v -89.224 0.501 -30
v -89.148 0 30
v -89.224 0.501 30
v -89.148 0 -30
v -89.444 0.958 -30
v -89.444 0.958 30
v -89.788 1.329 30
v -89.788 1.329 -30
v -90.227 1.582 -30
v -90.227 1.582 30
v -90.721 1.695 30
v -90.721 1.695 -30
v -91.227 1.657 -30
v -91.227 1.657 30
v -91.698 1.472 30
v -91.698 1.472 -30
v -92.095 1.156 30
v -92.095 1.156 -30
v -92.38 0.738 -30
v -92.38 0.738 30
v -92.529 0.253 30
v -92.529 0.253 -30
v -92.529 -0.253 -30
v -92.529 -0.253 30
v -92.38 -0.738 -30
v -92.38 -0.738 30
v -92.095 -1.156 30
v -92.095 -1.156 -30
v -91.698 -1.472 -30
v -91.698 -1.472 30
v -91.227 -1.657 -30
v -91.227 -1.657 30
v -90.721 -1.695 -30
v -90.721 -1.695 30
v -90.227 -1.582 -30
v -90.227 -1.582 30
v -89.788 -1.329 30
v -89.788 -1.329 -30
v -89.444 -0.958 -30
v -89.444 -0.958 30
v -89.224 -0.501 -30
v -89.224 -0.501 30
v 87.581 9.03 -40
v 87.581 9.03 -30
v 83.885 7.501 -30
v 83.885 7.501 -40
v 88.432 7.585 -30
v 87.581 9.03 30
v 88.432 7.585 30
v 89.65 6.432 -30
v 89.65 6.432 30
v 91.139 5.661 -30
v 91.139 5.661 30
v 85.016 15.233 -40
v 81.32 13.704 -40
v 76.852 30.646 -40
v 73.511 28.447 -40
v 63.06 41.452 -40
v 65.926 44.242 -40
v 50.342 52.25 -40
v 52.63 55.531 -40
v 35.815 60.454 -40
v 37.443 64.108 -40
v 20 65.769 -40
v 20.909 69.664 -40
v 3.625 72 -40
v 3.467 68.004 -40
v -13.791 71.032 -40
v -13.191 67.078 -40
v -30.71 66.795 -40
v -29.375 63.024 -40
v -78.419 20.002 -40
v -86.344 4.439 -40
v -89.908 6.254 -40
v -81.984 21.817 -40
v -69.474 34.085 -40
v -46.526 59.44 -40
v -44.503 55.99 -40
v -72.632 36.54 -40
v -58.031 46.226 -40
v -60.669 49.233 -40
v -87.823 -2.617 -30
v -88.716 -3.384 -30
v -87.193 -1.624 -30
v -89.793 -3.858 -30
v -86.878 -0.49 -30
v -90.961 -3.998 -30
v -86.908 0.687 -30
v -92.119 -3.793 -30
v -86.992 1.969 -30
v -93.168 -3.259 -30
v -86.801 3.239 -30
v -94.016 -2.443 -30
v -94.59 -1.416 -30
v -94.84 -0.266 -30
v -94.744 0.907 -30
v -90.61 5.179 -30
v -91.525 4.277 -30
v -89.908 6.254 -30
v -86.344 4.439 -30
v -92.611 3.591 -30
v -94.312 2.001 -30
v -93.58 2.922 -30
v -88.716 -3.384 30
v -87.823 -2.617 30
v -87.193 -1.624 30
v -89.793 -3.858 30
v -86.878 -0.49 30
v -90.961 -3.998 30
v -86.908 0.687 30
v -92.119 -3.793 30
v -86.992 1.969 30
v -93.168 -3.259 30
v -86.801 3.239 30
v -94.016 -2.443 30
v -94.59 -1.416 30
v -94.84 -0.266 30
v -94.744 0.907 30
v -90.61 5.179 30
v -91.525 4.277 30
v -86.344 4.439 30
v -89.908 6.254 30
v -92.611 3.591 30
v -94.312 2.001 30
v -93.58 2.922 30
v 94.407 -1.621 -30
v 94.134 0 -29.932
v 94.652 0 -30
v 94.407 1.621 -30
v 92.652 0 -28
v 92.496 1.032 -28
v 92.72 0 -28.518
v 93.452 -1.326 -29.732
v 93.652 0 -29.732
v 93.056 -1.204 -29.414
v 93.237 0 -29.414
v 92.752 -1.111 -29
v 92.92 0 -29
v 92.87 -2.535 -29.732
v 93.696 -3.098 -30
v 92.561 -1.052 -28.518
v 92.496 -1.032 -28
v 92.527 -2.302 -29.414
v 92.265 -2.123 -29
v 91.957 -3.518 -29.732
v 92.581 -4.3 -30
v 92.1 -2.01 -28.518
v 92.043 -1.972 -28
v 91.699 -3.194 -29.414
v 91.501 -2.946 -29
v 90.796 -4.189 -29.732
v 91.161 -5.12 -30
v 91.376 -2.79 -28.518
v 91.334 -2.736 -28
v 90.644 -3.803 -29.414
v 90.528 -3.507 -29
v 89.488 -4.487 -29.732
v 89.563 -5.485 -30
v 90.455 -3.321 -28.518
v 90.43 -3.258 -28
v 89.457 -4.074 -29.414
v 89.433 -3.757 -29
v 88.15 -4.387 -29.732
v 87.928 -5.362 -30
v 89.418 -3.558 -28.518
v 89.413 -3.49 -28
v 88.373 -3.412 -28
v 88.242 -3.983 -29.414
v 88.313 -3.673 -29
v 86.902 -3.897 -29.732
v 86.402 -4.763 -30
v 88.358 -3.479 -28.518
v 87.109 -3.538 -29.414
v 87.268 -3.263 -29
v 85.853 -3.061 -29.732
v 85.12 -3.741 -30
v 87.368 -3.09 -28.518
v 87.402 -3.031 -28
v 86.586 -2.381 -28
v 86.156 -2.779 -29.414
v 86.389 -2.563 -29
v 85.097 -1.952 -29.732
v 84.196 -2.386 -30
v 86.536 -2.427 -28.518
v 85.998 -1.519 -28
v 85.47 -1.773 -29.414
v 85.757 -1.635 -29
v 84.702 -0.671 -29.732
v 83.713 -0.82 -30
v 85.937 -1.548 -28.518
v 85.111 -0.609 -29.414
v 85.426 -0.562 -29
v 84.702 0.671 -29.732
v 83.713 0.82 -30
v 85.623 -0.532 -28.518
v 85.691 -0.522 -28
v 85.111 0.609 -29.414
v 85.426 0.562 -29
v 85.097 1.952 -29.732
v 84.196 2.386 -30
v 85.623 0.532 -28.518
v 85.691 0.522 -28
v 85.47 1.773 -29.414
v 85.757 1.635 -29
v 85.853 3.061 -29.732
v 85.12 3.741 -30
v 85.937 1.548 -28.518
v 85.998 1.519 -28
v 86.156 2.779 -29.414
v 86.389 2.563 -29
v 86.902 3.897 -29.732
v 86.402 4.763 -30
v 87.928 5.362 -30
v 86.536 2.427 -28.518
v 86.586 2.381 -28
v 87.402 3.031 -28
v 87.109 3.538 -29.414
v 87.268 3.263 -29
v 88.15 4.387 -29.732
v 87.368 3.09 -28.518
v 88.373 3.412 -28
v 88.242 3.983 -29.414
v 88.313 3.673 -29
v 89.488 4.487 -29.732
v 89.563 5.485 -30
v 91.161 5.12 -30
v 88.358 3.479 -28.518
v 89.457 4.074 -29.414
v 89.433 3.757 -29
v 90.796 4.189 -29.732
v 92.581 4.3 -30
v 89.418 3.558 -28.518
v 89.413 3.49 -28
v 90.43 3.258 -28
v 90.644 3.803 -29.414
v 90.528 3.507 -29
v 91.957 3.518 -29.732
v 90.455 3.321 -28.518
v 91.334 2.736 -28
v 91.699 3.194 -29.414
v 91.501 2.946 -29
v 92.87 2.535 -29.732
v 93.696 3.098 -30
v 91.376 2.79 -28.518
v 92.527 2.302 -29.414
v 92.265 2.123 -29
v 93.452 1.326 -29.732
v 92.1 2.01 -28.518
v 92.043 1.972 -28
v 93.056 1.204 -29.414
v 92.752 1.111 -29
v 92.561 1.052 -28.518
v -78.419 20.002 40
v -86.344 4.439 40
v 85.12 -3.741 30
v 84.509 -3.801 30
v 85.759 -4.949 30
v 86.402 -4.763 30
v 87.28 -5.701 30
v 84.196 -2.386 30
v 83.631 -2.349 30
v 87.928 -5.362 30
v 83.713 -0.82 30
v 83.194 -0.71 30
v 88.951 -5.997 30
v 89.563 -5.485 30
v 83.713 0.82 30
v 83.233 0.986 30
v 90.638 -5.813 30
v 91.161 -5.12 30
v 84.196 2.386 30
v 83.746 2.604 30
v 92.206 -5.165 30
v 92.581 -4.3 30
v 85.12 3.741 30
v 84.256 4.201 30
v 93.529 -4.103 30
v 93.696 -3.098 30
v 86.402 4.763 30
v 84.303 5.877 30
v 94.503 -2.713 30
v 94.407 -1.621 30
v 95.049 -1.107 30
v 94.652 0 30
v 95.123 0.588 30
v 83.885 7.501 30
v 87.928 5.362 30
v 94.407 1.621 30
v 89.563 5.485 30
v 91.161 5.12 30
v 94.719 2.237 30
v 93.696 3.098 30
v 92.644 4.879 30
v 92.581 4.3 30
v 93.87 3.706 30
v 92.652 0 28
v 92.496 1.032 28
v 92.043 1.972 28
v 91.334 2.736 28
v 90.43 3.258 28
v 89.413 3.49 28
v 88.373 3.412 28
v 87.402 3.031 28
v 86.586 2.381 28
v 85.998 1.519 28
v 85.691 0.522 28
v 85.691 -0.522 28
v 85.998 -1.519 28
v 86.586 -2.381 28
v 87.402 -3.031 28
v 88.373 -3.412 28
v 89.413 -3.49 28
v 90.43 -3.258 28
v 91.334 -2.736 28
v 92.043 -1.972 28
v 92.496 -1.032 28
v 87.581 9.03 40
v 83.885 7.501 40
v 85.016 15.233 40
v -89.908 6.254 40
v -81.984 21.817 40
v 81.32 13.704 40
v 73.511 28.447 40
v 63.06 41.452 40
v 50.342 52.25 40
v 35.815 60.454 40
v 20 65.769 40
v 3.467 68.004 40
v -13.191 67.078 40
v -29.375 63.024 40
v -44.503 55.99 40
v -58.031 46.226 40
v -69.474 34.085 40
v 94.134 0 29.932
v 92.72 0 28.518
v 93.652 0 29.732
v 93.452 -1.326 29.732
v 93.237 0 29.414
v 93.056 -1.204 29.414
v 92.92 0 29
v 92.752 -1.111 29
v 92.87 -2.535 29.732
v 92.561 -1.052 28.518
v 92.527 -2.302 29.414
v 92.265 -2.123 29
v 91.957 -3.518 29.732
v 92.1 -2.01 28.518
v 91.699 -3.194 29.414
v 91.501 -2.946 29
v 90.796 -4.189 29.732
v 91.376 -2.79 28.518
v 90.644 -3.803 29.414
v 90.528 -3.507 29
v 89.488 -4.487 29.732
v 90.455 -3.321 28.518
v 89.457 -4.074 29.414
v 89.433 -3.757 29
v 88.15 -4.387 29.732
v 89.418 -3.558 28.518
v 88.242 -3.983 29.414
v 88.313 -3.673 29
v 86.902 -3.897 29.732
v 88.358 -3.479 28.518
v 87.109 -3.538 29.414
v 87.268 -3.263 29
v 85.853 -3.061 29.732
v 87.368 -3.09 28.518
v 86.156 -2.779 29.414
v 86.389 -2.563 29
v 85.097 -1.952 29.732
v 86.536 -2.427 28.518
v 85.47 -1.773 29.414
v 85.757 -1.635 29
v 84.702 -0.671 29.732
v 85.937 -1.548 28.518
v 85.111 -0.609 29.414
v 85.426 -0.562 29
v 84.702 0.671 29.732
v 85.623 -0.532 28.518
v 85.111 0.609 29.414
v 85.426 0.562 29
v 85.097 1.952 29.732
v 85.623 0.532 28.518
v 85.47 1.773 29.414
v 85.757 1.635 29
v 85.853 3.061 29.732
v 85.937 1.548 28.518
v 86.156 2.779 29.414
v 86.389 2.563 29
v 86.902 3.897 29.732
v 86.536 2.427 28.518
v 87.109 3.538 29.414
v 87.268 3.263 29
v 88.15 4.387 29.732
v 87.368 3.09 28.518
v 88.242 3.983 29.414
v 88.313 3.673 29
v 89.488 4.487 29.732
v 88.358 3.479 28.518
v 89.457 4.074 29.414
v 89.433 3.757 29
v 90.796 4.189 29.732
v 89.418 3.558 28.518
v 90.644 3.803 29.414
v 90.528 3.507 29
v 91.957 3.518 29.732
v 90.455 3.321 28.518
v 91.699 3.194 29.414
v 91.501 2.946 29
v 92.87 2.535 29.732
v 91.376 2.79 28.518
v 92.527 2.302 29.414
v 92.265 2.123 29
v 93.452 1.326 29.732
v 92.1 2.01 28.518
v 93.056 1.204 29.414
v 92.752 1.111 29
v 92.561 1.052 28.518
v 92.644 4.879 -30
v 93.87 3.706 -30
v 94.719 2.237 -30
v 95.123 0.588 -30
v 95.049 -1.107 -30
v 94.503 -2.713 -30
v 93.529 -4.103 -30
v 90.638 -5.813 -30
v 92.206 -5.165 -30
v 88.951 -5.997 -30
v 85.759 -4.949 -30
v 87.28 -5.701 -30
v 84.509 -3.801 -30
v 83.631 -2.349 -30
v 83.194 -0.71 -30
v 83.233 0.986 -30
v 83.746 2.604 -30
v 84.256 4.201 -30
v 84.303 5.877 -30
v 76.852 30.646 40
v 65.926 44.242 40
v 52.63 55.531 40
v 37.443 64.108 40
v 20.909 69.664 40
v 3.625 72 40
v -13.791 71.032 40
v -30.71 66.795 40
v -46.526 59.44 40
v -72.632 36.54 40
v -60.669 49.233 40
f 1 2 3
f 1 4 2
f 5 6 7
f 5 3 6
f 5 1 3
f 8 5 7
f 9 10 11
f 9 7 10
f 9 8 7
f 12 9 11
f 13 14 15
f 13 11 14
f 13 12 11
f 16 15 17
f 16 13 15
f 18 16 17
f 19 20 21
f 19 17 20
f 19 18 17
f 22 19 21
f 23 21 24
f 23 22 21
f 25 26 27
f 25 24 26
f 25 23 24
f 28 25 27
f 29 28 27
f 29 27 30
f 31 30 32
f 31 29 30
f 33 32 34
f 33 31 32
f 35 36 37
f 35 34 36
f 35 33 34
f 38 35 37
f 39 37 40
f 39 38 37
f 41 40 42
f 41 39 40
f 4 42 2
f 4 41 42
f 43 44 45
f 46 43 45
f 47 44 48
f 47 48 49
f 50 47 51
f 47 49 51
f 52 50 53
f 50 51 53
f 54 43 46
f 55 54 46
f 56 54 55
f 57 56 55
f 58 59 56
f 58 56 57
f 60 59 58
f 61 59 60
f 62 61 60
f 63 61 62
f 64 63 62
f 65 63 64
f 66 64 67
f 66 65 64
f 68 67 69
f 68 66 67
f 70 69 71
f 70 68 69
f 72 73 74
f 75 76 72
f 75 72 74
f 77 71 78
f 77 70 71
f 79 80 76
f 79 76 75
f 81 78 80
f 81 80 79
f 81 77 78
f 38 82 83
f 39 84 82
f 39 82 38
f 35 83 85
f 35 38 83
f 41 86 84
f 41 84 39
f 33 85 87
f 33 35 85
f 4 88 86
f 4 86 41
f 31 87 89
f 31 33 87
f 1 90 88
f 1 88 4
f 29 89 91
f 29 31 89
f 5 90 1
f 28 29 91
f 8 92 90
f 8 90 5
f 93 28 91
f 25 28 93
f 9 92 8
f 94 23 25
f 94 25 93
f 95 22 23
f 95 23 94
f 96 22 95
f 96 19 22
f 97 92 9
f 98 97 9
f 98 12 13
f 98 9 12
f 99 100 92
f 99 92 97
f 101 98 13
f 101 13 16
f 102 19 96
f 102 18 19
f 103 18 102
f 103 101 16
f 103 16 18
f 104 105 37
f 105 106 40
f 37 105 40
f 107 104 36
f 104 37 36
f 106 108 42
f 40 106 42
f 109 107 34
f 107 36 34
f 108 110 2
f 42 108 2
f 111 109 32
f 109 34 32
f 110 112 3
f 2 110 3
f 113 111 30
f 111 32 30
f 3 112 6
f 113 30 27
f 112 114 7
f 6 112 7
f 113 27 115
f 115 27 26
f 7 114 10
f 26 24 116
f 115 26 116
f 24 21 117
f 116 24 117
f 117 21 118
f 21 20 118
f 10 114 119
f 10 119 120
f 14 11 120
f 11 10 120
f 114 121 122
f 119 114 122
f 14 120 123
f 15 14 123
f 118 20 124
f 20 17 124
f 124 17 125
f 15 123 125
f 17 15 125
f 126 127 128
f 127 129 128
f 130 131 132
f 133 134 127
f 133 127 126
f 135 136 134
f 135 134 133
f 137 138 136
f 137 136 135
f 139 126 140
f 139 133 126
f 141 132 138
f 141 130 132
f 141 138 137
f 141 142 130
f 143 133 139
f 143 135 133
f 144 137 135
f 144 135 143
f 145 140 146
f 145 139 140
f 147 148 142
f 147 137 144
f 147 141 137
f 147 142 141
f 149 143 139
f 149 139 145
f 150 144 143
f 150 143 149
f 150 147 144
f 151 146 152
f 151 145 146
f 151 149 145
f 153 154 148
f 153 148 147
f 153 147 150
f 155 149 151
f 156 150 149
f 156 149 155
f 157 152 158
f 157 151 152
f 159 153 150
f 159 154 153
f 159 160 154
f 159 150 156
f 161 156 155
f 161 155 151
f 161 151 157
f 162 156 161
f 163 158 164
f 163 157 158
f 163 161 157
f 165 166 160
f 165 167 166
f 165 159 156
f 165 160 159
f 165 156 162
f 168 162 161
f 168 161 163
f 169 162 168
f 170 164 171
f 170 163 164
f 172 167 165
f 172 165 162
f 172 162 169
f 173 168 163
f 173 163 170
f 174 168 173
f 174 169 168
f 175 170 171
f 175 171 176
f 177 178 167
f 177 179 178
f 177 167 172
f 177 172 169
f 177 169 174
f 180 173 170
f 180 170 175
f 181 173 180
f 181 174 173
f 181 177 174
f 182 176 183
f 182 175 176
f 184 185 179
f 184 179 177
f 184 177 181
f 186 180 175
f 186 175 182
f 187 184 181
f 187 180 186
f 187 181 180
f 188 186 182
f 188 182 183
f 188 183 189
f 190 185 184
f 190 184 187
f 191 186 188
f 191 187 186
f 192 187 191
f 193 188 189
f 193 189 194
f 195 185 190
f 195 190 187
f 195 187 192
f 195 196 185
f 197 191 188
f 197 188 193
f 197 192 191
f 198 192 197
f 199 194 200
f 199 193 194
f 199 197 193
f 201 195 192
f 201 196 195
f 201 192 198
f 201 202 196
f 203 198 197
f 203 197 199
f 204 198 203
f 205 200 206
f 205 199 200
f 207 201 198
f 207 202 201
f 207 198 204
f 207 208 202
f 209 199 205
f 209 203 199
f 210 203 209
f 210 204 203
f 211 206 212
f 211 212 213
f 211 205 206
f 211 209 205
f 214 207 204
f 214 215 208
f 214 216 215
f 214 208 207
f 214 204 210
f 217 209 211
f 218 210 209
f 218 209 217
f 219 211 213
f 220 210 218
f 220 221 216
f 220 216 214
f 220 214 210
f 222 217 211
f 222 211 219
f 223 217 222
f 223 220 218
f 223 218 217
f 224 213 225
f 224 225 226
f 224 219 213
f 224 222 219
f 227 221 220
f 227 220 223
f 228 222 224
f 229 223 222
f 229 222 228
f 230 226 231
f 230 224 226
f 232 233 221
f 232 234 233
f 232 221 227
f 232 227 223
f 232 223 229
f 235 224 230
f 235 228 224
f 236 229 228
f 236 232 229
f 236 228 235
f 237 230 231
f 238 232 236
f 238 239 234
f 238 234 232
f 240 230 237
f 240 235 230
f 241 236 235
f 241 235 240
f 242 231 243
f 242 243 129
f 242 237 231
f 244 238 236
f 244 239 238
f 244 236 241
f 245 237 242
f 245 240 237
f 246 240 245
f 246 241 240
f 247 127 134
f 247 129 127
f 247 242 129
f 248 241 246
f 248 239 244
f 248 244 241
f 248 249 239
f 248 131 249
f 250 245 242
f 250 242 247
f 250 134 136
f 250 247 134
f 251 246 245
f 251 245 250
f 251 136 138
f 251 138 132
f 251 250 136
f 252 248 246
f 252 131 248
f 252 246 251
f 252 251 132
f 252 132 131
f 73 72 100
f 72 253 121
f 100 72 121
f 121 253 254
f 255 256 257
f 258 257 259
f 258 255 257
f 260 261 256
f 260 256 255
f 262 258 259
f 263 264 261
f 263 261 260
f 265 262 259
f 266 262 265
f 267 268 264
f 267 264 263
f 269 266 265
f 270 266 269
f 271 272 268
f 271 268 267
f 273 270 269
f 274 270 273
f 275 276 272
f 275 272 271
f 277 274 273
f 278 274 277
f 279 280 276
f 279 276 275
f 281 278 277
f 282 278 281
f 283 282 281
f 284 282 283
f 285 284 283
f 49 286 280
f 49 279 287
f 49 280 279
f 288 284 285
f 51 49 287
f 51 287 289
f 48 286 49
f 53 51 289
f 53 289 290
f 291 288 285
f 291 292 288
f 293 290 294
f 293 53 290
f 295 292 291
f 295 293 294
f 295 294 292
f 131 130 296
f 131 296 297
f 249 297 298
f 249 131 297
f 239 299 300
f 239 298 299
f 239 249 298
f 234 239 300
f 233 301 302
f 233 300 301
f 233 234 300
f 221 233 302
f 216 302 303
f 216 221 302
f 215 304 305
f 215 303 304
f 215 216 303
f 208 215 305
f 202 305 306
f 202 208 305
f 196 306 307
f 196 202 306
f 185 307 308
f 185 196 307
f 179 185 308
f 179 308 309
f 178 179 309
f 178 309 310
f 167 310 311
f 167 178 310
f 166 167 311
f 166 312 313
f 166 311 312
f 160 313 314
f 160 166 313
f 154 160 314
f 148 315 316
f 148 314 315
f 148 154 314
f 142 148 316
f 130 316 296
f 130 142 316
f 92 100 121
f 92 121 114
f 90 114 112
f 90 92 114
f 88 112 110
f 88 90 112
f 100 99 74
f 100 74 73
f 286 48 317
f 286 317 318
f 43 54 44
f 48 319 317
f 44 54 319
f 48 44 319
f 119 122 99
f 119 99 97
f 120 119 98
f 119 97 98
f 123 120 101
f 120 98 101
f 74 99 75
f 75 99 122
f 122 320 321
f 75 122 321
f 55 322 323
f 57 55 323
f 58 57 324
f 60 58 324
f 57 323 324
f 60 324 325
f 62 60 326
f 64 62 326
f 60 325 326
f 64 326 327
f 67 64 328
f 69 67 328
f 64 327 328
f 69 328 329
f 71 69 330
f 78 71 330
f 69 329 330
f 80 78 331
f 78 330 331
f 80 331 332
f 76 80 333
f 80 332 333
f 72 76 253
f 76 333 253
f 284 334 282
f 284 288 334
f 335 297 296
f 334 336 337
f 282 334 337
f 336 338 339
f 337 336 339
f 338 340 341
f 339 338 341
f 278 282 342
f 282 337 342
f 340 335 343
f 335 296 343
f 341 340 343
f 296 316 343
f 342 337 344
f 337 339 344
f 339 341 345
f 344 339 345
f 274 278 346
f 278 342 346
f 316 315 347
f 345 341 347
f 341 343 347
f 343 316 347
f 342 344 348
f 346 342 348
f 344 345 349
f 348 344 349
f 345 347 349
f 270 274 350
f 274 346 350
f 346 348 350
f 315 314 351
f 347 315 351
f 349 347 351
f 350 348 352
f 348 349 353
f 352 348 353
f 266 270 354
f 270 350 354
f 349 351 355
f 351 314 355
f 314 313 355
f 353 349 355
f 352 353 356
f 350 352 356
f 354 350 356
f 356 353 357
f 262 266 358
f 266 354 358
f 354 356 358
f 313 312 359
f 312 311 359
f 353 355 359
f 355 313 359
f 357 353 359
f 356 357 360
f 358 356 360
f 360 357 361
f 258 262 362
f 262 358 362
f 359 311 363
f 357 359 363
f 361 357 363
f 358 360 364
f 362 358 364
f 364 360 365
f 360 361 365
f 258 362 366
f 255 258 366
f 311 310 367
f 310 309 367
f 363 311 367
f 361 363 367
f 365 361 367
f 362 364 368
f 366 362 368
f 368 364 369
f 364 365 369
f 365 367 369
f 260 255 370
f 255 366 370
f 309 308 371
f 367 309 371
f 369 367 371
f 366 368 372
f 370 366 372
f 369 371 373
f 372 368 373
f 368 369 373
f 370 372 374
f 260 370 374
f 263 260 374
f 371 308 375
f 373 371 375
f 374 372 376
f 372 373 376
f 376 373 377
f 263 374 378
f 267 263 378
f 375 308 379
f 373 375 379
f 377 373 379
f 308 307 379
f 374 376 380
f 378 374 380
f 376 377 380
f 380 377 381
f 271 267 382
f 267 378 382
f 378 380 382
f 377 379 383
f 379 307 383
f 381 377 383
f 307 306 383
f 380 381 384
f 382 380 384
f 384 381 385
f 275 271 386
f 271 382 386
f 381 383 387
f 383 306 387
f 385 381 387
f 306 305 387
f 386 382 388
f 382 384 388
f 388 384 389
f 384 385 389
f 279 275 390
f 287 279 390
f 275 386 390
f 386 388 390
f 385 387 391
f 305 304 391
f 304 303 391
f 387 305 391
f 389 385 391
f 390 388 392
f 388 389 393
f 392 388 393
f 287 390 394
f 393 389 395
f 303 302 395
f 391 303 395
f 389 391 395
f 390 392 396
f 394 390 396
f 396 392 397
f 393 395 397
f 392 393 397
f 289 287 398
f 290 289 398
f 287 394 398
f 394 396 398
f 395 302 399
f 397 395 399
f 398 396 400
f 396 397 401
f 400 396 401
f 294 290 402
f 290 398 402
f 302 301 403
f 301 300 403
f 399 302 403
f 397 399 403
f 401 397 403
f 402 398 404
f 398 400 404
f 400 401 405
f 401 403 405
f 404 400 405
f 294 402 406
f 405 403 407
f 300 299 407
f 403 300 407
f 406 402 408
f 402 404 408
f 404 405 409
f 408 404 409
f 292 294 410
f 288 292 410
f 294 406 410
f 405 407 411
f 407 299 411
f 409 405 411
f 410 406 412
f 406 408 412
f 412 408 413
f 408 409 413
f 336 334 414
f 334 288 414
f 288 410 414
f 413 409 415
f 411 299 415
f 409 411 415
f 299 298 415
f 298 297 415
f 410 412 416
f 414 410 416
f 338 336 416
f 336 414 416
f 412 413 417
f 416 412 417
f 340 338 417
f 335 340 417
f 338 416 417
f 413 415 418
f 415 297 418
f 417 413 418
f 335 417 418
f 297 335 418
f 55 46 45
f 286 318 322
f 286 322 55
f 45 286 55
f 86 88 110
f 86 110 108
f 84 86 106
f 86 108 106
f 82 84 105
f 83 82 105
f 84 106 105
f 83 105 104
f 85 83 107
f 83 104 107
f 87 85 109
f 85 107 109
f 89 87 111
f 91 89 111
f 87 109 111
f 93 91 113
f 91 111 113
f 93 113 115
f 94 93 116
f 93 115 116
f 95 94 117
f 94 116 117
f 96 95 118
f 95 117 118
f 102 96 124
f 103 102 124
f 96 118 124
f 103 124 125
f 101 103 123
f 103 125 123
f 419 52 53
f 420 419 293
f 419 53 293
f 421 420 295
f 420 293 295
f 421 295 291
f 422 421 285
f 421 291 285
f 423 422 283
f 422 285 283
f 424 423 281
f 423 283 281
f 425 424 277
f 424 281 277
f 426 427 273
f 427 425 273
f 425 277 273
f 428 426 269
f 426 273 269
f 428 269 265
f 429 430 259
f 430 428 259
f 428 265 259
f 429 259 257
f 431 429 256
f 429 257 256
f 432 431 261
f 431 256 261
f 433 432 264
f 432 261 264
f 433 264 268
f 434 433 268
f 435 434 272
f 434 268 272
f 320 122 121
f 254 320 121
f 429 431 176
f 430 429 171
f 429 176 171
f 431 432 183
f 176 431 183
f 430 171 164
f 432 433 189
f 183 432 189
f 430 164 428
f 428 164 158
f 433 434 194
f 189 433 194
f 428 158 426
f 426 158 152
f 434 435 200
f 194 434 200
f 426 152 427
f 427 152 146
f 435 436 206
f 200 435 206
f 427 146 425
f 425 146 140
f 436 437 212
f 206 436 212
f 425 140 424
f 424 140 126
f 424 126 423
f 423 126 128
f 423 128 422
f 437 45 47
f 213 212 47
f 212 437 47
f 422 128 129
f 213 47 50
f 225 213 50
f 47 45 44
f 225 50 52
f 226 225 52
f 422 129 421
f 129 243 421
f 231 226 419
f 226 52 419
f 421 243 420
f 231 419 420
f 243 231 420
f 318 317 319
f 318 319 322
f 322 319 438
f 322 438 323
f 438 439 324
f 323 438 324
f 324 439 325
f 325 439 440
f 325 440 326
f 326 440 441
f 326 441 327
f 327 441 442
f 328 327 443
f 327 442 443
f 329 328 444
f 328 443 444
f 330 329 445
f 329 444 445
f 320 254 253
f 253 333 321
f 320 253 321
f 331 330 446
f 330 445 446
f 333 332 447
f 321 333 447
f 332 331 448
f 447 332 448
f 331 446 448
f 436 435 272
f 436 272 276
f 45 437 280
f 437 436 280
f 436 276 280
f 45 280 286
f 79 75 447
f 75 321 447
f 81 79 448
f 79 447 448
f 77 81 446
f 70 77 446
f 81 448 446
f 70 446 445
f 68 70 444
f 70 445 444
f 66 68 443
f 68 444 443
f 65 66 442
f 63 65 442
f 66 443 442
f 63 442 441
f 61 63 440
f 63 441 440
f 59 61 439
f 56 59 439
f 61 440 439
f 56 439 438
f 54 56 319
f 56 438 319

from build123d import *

# Parameters (mm, degrees)
CROQUIS1_R              = 1.7
CROQUIS1_R_2            = 3.5
SALIENTE_EXTRUIR1_DEPTH = 40
REDONDEO1_R             = 6
CORTAR_EXTRUIR1_DEPTH   = 10
REDONDEO2_R             = 2


with BuildPart() as part:
    # Croquis1 → Saliente-Extruir1 (new body, symmetric)
    with BuildSketch(Plane.XY):
        with BuildLine():
            Line((-78.419273977, 20.002017027), (-87.494309747, 2.17945476))
            ThreePointArc((-87.494309747, 2.17945476), (-92.663415431, -3.564512453), (-91.0588222, 3.994461914))
            Line((-91.0588222, 3.994461914), (-81.98378643, 21.817024181))
            ThreePointArc((-81.98378643, 21.817024181), (3.624504321, 72.000435004), (85.015988263, 15.232657976))
            Line((85.015988263, 15.232657976), (88.837814169, 5.991789686))
            ThreePointArc((88.837814169, 5.991789686), (91.444687267, -5.544520974), (85.141466854, 4.463059324))
            Line((85.141466854, 4.463059324), (81.319640948, 13.703927614))
            ThreePointArc((81.319640948, 13.703927614), (3.466917176, 68.003540423), (-78.419273977, 20.002017027))
        make_face()
        with Locations((-90.848408277, 0)):
            Circle(CROQUIS1_R, mode=Mode.SUBTRACT)
        with Locations((89.151591723, 0)):
            Circle(CROQUIS1_R_2, mode=Mode.SUBTRACT)
    extrude(amount=SALIENTE_EXTRUIR1_DEPTH, both=True)

    # Redondeo1
    redondeo1_edges = [part.edges().sort_by_distance(p)[0] for p in [
        (-87.494309747, 2.17945476, 0),
        (-91.0588222, 3.994461914, 0),
        (88.837814169, 5.991789686, 0),
        (85.141466854, 4.463059324, 0),
    ]]
    fillet(redondeo1_edges, radius=REDONDEO1_R)

    # Croquis2 → Cortar-Extruir1 (cut)
    with BuildSketch(Plane(origin=(0, 0, -40), x_dir=(-1, 0, 0), z_dir=(0, 0, -1))):
        with BuildLine():
            Line((89.908153773, 6.254272257), (86.343641319, 4.439265103))
            ThreePointArc((86.343641319, 4.439265103), (86.930196271, 2.608758116), (86.907794022, 0.686701749))
            ThreePointArc((86.907794022, 0.686701749), (92.663415431, -3.564512453), (92.611013947, 3.590713195))
            ThreePointArc((92.611013947, 3.590713195), (91.043465794, 4.703185814), (89.908153773, 6.254272257))
        make_face()
        with BuildLine():
            Line((-87.581420372, 9.029649048), (-83.885073056, 7.500918685))
            ThreePointArc((-83.885073056, 7.500918685), (-84.338136431, 5.037582192), (-83.746071903, 2.603911571))
            ThreePointArc((-83.746071903, 2.603911571), (-91.444687267, -5.544520974), (-91.138766534, 5.661372296))
            ThreePointArc((-91.138766534, 5.661372296), (-89.000661668, 6.965903123), (-87.581420372, 9.029649048))
        make_face()
    cortar_extruir1 = extrude(amount=-CORTAR_EXTRUIR1_DEPTH, mode=Mode.SUBTRACT)

    # Simetría1: Cortar-Extruir1 across plane
    add(cortar_extruir1.mirror(Plane.XY), mode=Mode.SUBTRACT)

    # Redondeo2
    redondeo2_edges = [part.edges().sort_by_distance(p)[0] for p in [
        (85.651591723, 0, 30),
        (85.651591723, 0, -30),
    ]]
    fillet(redondeo2_edges, radius=REDONDEO2_R)


solid = part.part
